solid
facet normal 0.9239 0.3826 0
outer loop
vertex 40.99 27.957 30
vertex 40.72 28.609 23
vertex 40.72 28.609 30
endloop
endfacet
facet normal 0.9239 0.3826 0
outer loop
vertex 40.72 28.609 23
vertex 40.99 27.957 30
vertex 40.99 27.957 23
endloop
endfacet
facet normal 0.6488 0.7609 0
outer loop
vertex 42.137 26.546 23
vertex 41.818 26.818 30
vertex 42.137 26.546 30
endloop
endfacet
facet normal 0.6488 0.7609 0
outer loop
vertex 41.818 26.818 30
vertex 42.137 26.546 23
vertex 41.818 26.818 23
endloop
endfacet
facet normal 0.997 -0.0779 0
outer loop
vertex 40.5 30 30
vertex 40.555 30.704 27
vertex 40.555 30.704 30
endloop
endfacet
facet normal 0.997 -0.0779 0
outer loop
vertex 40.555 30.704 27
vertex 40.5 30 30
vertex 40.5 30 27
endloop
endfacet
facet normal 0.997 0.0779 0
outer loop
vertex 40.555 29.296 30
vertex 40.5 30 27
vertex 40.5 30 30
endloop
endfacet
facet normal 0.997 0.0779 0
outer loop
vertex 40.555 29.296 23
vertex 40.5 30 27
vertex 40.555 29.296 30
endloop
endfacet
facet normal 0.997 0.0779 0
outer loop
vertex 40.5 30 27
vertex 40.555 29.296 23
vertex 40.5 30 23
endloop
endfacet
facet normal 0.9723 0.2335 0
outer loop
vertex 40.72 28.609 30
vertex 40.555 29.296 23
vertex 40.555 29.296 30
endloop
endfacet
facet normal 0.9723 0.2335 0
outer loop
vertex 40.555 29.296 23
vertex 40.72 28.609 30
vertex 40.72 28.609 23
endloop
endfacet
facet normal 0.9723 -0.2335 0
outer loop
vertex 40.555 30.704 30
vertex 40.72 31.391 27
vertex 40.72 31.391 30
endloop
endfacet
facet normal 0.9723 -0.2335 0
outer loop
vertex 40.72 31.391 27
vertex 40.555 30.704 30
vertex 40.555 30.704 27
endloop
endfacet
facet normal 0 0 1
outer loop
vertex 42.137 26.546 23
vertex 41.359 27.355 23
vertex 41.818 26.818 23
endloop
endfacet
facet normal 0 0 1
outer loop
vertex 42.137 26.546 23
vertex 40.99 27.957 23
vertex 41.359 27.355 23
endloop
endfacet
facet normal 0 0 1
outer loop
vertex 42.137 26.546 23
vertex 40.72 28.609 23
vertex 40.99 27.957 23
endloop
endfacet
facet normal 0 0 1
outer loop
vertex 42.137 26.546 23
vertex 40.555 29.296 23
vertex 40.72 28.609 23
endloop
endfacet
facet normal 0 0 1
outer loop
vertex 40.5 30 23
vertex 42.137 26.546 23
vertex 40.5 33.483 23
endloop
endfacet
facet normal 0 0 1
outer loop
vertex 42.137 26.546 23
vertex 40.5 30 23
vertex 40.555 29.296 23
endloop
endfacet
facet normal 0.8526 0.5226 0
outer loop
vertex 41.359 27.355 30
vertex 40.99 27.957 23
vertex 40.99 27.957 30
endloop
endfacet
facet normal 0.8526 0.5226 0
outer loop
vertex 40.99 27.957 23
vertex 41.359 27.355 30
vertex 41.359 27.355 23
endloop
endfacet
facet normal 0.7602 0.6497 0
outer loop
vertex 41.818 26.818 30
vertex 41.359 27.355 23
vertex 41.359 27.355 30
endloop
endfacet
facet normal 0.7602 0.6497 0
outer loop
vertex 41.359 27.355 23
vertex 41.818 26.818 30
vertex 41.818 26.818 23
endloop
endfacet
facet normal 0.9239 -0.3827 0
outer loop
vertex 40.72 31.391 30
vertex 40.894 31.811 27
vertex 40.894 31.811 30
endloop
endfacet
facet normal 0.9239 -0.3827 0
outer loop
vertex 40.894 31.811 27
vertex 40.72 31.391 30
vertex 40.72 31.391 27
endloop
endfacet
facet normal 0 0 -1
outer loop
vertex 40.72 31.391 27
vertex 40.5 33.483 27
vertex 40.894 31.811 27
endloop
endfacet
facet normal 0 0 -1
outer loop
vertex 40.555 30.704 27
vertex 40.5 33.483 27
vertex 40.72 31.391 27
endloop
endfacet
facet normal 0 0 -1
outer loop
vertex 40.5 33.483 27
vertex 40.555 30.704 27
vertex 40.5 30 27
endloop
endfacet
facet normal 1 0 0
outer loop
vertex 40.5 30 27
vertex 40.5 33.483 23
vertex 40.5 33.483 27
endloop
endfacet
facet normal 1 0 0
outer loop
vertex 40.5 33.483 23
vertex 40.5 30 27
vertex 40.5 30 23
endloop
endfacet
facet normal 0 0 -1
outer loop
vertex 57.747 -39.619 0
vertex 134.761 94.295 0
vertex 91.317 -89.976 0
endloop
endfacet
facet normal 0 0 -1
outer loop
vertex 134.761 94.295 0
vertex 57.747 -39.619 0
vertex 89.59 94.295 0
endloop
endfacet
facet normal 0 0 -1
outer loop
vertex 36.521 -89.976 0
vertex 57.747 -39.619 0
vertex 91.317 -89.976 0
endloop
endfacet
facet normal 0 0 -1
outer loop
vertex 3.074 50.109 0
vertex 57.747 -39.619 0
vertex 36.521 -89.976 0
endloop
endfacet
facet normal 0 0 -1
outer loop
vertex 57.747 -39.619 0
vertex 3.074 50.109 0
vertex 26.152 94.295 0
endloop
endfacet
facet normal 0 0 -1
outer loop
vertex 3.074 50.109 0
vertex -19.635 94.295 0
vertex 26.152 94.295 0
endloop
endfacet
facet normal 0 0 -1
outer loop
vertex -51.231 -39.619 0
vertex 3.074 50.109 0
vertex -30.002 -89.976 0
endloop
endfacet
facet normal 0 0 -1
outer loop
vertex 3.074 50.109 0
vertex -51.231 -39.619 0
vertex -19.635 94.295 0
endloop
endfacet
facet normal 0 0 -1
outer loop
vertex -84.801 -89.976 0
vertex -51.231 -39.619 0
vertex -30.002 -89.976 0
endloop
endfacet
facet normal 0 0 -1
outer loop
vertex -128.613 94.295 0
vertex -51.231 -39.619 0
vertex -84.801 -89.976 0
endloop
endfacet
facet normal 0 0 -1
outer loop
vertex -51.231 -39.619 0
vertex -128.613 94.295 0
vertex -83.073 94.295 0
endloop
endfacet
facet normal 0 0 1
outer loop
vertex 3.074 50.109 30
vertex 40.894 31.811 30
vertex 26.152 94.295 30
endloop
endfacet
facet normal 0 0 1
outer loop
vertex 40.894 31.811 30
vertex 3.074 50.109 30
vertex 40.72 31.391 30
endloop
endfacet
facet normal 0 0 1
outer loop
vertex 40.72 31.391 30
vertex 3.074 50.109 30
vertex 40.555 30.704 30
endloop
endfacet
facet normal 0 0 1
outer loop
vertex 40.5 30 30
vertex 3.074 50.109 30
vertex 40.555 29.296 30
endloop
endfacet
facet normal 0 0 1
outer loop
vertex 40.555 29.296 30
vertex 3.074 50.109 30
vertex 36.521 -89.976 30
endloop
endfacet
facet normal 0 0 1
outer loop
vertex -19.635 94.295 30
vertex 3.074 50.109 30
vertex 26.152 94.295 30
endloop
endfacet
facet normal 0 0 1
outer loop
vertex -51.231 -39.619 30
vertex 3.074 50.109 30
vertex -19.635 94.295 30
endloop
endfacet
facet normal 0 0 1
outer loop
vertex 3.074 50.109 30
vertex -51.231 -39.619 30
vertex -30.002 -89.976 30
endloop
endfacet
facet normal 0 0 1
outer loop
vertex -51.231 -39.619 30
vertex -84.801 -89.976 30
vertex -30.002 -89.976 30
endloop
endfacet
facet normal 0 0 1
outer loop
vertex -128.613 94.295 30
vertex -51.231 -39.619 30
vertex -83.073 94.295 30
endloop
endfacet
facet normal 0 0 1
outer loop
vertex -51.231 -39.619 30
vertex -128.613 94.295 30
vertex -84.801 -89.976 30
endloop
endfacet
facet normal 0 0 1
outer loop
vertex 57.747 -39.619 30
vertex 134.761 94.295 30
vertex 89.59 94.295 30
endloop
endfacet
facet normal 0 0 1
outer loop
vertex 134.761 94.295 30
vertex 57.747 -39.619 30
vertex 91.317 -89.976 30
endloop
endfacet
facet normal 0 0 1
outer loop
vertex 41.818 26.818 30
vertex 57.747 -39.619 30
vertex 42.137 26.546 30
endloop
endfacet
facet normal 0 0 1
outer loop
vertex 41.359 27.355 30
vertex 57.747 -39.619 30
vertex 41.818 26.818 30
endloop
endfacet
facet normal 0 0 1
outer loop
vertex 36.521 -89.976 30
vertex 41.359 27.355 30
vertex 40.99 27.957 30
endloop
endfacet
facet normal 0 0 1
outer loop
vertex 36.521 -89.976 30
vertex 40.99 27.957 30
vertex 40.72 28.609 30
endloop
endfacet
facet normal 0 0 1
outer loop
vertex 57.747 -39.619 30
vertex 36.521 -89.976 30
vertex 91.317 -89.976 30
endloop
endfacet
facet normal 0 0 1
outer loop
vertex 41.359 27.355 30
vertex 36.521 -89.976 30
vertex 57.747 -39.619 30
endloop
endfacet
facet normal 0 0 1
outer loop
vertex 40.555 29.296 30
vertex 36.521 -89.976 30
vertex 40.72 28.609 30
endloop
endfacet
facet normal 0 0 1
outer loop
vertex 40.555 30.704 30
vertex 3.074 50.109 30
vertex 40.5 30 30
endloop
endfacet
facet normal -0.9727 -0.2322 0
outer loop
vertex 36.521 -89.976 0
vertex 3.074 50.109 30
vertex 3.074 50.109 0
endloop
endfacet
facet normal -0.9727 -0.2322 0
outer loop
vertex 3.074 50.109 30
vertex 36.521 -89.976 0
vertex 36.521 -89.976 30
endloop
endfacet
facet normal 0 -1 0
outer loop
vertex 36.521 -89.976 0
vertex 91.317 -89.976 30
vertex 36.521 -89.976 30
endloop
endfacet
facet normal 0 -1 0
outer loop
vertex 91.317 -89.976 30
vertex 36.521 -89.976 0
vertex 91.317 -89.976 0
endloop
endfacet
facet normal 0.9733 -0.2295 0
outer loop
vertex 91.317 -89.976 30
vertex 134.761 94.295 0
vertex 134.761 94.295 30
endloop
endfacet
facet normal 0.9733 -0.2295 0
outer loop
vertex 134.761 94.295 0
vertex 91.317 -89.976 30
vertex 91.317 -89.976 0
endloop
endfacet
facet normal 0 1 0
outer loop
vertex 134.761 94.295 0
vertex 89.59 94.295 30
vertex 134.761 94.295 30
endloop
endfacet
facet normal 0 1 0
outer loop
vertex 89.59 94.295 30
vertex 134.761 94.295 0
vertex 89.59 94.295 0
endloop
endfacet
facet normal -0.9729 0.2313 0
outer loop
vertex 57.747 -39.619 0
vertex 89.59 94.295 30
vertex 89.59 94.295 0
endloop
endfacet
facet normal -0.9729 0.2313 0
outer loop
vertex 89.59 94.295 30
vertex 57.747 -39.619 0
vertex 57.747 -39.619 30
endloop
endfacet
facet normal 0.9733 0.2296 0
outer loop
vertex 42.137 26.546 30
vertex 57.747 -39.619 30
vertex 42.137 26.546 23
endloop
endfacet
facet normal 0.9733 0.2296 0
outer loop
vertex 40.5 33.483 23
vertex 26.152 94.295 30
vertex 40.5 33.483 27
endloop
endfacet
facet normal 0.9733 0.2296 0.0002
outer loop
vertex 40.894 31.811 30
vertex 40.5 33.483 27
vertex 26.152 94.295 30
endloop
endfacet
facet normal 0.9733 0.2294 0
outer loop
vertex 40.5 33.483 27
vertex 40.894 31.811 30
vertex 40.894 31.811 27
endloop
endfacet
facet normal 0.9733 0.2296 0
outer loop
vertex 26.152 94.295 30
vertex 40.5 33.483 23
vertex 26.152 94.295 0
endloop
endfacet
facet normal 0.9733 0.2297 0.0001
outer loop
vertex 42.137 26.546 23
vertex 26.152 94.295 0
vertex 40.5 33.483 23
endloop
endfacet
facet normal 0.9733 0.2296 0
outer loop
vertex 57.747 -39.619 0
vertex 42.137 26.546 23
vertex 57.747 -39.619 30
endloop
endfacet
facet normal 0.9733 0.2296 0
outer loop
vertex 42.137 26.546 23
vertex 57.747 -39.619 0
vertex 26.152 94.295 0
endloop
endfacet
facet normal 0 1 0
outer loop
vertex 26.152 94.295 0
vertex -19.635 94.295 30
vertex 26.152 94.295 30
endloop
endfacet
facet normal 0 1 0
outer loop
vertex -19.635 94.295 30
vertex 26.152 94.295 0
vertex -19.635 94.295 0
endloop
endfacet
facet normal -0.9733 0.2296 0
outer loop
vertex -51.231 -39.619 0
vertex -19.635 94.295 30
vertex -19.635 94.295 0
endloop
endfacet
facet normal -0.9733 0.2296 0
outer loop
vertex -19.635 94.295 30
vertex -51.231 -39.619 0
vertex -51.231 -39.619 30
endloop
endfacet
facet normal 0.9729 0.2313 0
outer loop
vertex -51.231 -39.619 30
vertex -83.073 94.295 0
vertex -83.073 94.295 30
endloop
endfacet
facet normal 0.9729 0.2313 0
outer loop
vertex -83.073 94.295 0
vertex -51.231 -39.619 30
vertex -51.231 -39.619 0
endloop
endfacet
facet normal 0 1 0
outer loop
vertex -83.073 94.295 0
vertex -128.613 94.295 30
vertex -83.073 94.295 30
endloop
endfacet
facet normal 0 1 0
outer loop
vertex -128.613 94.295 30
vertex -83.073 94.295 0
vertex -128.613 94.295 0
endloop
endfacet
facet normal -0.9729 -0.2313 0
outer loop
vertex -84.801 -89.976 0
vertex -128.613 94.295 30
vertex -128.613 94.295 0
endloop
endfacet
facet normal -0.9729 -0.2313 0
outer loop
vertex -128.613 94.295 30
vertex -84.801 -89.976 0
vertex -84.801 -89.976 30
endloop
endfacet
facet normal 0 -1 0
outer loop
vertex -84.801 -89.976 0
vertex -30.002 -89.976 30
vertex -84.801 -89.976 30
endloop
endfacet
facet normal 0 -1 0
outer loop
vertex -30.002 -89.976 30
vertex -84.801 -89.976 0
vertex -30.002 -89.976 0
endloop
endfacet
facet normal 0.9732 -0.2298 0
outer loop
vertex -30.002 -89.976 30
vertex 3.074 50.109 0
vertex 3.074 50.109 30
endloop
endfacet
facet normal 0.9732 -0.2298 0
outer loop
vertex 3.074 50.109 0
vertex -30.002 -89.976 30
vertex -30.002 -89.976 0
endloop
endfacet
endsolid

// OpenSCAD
// Logotipo COW AI - Letra W (Relieve 30mm)
// Diseñado para impresión en Bambu Lab P1S (Cara frontal hacia abajo en cama PEI)


$fn = 40;

// Keyhole hanger pocket for wall mounting (face-down printing: rear is at z=depth)
module keyhole_pocket(depth = 30) {
    translate([0, 0, depth - 7]) {
        // Screw head insertion pocket (9mm dia, 7.2mm deep)
        cylinder(d = 9.0, h = 7.2);
        
        // Internal slide channel for screw head (9mm wide, 12mm high, 4mm deep)
        translate([-4.5, 0, 0]) cube([9.0, 12.0, 4.0]);
        translate([0, 12, 0]) cylinder(d = 9.0, h = 4.0);
        
        // Screw shank slot to the wall surface (4.6mm wide, 12mm high, 3.2mm deep)
        translate([-2.3, 0, 4.0]) cube([4.6, 12.0, 3.2]);
        translate([0, 12, 4.0]) cylinder(d = 4.6, h = 3.2);
    }
}


difference() {
    // Letra extruida 30mm
    linear_extrude(height = 30, convexity = 10)
        text("W", font = "Ubuntu:style=Bold", size = 182, halign = "center", valign = "center");
        
    // Alojamientos traseros para anclaje a pared
    translate([-45, 30, 0]) keyhole_pocket(depth = 30);
    translate([45, 30, 0]) keyhole_pocket(depth = 30);
}
